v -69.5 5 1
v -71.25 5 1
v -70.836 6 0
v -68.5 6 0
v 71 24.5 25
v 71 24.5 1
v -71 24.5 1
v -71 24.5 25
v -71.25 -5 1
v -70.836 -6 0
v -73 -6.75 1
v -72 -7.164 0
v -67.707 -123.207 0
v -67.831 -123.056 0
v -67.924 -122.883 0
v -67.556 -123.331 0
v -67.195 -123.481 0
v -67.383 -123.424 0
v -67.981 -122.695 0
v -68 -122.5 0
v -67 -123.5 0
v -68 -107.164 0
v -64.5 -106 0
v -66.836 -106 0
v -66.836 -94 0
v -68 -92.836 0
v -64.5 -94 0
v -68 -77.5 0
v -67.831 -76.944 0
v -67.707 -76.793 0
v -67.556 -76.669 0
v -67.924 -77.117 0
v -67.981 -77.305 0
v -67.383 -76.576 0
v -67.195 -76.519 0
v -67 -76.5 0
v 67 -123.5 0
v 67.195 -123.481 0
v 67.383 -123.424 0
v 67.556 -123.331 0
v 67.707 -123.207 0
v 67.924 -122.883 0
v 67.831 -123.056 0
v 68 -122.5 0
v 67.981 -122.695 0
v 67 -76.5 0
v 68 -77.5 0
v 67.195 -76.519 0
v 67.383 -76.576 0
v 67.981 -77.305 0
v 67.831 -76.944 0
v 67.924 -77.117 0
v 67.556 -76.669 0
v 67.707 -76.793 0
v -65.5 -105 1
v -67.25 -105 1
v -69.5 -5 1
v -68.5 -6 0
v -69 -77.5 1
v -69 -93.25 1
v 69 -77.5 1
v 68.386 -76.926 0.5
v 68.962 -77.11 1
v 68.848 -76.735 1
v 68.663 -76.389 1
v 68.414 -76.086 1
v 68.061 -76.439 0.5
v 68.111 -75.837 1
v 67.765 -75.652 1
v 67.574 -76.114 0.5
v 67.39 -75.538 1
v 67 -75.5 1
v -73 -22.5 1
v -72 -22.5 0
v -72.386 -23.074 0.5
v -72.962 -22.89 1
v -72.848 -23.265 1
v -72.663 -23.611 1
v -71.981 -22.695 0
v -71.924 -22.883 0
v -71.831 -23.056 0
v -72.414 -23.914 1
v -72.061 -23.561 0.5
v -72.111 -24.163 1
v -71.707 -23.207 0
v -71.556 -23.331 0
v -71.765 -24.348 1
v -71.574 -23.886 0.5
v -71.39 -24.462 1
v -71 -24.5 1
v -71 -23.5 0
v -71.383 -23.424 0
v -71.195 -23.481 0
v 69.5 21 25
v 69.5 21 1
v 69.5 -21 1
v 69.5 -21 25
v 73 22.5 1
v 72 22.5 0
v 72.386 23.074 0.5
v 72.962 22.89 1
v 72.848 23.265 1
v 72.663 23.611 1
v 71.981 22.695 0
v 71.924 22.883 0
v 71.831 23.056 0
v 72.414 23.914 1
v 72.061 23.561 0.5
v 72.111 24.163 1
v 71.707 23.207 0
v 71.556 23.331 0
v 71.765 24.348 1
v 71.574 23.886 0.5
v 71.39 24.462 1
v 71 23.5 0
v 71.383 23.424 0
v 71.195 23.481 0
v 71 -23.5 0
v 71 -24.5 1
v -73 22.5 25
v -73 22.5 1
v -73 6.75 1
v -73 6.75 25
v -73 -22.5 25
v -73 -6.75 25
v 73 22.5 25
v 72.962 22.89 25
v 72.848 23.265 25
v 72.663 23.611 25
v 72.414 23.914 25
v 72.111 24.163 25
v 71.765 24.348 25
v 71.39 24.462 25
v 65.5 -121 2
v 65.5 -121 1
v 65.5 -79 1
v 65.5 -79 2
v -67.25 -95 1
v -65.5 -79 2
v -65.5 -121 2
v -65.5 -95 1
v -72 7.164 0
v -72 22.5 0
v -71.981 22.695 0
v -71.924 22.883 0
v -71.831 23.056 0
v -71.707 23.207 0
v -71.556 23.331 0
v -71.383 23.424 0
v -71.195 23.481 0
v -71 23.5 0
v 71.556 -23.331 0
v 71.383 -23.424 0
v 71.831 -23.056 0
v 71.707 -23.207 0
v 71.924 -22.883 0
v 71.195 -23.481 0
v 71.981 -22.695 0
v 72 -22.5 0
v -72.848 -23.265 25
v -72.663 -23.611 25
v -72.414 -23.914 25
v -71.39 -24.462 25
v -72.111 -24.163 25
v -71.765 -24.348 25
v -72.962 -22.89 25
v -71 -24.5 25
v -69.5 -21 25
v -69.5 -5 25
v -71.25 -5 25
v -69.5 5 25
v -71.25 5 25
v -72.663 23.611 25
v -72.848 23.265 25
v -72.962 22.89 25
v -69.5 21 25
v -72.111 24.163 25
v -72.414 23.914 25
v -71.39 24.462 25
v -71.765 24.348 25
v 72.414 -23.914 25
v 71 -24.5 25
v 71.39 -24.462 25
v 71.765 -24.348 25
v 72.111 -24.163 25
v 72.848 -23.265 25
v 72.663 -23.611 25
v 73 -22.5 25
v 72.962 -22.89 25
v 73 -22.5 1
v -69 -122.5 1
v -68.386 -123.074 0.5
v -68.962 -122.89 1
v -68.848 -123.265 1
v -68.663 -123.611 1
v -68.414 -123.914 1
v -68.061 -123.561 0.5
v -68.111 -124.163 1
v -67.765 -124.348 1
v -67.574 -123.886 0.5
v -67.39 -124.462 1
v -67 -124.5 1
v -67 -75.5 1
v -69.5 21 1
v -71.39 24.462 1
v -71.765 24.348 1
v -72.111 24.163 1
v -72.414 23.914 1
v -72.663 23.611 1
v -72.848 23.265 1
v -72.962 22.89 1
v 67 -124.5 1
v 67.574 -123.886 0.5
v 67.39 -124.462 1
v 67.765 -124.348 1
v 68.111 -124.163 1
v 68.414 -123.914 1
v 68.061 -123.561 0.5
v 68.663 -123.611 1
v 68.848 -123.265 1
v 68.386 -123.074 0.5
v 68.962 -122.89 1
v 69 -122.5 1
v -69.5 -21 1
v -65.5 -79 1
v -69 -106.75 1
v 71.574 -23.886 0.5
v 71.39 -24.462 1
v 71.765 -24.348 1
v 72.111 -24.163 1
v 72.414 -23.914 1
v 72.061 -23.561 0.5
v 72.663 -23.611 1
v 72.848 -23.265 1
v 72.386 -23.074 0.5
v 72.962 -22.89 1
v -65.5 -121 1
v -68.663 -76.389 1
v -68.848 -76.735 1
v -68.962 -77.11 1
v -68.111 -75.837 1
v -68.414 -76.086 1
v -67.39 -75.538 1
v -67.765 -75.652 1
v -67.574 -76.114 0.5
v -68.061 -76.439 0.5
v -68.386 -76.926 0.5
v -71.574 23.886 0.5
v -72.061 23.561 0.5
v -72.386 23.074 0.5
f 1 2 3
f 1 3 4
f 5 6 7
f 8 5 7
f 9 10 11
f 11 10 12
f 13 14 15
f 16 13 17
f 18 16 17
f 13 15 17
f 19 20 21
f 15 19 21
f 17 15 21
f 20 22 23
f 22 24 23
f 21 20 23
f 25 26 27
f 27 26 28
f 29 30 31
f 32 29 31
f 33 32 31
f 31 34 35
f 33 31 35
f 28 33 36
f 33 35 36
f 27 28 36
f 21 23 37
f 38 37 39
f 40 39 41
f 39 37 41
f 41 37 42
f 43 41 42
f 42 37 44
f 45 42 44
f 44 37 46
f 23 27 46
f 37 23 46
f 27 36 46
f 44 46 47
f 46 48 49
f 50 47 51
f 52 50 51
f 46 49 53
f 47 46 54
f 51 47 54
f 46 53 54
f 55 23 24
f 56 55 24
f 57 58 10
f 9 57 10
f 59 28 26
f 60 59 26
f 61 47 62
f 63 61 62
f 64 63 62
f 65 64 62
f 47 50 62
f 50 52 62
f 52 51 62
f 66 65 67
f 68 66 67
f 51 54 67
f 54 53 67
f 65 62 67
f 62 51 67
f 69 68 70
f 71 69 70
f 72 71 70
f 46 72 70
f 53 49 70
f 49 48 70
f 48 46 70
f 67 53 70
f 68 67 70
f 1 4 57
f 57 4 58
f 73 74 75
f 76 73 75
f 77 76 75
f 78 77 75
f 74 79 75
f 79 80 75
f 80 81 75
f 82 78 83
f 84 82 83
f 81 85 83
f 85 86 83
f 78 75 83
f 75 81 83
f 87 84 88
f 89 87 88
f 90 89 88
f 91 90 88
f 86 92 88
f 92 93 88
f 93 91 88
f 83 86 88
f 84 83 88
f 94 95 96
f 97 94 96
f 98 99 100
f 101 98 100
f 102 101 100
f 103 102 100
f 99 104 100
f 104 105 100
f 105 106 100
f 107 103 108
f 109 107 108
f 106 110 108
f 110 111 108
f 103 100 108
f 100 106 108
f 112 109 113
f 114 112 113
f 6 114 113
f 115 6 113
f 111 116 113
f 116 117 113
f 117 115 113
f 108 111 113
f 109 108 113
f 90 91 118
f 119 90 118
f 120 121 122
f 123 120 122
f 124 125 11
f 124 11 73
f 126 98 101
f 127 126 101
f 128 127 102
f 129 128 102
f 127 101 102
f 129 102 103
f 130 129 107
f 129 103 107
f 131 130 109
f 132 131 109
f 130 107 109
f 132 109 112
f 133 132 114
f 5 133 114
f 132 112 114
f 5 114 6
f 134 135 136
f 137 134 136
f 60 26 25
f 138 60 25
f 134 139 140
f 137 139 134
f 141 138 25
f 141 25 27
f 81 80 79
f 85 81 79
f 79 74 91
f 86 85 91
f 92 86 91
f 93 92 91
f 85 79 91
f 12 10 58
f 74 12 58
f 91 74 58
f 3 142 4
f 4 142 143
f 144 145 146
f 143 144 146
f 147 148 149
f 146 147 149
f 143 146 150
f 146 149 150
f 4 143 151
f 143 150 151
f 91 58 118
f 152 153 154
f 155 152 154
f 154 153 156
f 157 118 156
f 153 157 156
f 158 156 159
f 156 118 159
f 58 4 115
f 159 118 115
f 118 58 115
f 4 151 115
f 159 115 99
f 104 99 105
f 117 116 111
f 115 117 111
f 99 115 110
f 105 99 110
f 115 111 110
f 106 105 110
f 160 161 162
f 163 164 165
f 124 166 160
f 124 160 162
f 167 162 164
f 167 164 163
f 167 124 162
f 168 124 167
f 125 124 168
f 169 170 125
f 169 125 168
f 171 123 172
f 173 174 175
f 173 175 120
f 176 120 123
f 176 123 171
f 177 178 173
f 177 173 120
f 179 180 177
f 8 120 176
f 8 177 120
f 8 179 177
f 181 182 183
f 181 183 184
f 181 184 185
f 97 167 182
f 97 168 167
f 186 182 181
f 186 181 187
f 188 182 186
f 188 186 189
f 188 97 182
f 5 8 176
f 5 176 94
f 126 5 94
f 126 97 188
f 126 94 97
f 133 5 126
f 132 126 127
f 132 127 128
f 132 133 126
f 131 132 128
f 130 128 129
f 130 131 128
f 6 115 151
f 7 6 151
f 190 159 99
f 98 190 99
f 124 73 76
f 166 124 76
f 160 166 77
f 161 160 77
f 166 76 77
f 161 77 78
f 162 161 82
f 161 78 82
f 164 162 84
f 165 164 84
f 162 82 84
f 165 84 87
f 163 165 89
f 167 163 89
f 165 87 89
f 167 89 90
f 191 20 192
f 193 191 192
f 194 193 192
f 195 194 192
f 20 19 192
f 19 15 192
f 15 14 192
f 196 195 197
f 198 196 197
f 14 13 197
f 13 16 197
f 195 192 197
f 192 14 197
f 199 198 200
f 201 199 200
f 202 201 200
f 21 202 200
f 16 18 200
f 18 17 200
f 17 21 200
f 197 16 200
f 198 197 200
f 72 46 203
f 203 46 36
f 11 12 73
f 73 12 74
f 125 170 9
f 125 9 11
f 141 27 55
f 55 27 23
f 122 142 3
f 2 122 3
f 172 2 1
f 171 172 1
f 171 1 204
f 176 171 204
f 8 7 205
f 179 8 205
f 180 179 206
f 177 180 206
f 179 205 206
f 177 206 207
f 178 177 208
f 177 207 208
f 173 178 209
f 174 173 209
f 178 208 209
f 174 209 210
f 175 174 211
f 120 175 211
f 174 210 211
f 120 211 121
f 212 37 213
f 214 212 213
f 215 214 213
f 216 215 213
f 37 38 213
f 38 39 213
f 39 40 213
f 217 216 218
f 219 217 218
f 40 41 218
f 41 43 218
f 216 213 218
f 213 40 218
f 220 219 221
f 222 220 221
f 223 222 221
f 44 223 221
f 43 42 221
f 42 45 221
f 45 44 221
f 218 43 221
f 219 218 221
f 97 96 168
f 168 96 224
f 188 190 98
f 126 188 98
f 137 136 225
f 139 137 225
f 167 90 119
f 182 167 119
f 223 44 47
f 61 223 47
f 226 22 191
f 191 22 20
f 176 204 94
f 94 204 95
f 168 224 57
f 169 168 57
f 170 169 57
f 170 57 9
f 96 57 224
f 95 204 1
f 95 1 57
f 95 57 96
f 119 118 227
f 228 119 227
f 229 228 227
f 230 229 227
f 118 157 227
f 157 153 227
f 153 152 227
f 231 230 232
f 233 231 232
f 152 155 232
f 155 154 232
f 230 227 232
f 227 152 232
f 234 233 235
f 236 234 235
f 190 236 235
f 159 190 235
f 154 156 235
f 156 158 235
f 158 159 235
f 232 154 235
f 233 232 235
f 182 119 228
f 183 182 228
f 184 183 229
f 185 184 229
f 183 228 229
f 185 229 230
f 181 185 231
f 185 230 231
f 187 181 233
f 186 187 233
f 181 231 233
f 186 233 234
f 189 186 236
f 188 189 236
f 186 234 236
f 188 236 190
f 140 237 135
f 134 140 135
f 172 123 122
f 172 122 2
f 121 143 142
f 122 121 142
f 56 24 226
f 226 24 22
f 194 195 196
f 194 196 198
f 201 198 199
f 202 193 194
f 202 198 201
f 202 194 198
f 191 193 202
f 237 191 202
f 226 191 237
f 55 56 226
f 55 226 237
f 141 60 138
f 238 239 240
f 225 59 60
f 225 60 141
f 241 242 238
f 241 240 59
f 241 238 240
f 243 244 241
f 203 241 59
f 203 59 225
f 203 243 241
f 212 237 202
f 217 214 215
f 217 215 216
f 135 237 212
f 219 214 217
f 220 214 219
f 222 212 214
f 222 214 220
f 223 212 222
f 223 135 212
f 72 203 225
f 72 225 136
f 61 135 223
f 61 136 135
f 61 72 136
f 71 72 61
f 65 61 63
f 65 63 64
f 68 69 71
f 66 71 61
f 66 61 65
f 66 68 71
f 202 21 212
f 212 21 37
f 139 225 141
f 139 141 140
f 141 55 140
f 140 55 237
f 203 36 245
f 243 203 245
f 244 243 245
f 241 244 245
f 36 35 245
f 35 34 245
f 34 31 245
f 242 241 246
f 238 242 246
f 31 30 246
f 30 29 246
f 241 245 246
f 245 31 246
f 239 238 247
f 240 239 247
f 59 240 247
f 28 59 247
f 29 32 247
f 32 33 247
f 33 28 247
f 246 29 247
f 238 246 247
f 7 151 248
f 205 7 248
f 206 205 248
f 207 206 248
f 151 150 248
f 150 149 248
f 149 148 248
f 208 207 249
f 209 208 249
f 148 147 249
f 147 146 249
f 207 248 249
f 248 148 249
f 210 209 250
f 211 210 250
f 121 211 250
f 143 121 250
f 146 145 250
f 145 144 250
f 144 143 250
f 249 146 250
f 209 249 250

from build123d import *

# Parameters (mm, degrees)
F1_DEPTH  = 1
F2_DEPTH  = 25
F3_DEPTH  = 1
F4_DEPTH  = 2
F5_SIZE   = 0.99999
F5_2_SIZE = 0.99999


# Not quite as in the source:
# - a fillet or chamfer is up to 0.001 mm smaller than in the source, because OpenCascade refuses the exact size


with BuildPart() as f1:
    # F0 (on Top) → F1 (new body)
    with BuildSketch(Plane.XY):
        Polygon((-69.5, -5), (-69.5, -21), (69.5, -21), (69.5, 21), (-69.5, 21), (-69.5, 5), align=None)
    extrude(amount=F1_DEPTH)

    # F0 (on Top) → F2 (join)
    with BuildSketch(Plane.XY):
        with BuildLine():
            Line((69.5, -21), (-69.5, -21))
            Line((-69.5, -21), (-69.5, -5))
            Line((-69.5, -5), (-71.25, -5))
            Line((-71.25, -5), (-73, -6.75))
            Line((-73, -6.75), (-73, -22.5))
            ThreePointArc((-73, -22.5), (-72.4142135624, -23.9142135624), (-71, -24.5))
            Line((-71, -24.5), (71, -24.5))
            ThreePointArc((71, -24.5), (72.4142135624, -23.9142135624), (73, -22.5))
            Line((73, -22.5), (73, 22.5))
            ThreePointArc((73, 22.5), (72.4142135624, 23.9142135624), (71, 24.5))
            Line((71, 24.5), (-71, 24.5))
            ThreePointArc((-71, 24.5), (-72.4142135624, 23.9142135624), (-73, 22.5))
            Line((-73, 22.5), (-73, 6.75))
            Line((-73, 6.75), (-71.25, 5))
            Line((-71.25, 5), (-69.5, 5))
            Line((-69.5, 5), (-69.5, 21))
            Line((-69.5, 21), (69.5, 21))
            Line((69.5, 21), (69.5, -21))
        make_face()
    extrude(amount=F2_DEPTH)

    # F5 (size 1 in the source; OpenCascade refuses exactly that, so slightly less here)
    f5_edges = [f1.edges().sort_by_distance(p)[0] for p in [
        (-69.5, 0, 0),
        (-70.375, -5, 0),
        (-72.125, -5.875, 0),
        (-73, -14.625, 0),
        (-72.414214, -23.914214, 0),
        (0, -24.5, 0),
        (72.414214, -23.914214, 0),
        (73, 0, 0),
        (72.414214, 23.914214, 0),
        (0, 24.5, 0),
        (-72.414214, 23.914214, 0),
        (-73, 14.625, 0),
        (-72.125, 5.875, 0),
        (-70.375, 5, 0),
    ]]
    chamfer(f5_edges, length=F5_SIZE)


with BuildPart() as f3:
    # F0 (on Top) → F3 (new body)
    with BuildSketch(Plane.XY):
        with BuildLine():
            Line((65.5, -121), (-65.5, -121))
            Line((-65.5, -121), (-65.5, -105))
            Line((-65.5, -105), (-67.25, -105))
            Line((-67.25, -105), (-69, -106.75))
            Line((-69, -106.75), (-69, -122.5))
            ThreePointArc((-69, -122.5), (-68.4142135624, -123.9142135624), (-67, -124.5))
            Line((-67, -124.5), (67, -124.5))
            ThreePointArc((67, -124.5), (68.4142135624, -123.9142135624), (69, -122.5))
            Line((69, -122.5), (69, -77.5))
            ThreePointArc((69, -77.5), (68.4142135624, -76.0857864376), (67, -75.5))
            Line((67, -75.5), (-67, -75.5))
            ThreePointArc((-67, -75.5), (-68.4142135624, -76.0857864376), (-69, -77.5))
            Line((-69, -77.5), (-69, -93.25))
            Line((-69, -93.25), (-67.25, -95))
            Line((-67.25, -95), (-65.5, -95))
            Line((-65.5, -95), (-65.5, -79))
            Line((-65.5, -79), (65.5, -79))
            Line((65.5, -79), (65.5, -121))
        make_face()
    extrude(amount=F3_DEPTH)

    # F0 (on Top) → F4 (join)
    with BuildSketch(Plane.XY):
        Polygon((-65.5, -105), (-65.5, -121), (65.5, -121), (65.5, -79), (-65.5, -79), (-65.5, -95), align=None)
    extrude(amount=F4_DEPTH)

    # F5#2 (size 1 in the source; OpenCascade refuses exactly that, so slightly less here)
    f5_2_edges = [f3.edges().sort_by_distance(p)[0] for p in [
        (0, -124.5, 0),
        (-68.125, -105.875, 0),
        (-68.125, -94.125, 0),
        (-66.375, -95, 0),
        (-66.375, -105, 0),
        (-65.5, -100, 0),
    ]]
    chamfer(f5_2_edges, length=F5_2_SIZE)


solid = Compound([f1.part, f3.part])
